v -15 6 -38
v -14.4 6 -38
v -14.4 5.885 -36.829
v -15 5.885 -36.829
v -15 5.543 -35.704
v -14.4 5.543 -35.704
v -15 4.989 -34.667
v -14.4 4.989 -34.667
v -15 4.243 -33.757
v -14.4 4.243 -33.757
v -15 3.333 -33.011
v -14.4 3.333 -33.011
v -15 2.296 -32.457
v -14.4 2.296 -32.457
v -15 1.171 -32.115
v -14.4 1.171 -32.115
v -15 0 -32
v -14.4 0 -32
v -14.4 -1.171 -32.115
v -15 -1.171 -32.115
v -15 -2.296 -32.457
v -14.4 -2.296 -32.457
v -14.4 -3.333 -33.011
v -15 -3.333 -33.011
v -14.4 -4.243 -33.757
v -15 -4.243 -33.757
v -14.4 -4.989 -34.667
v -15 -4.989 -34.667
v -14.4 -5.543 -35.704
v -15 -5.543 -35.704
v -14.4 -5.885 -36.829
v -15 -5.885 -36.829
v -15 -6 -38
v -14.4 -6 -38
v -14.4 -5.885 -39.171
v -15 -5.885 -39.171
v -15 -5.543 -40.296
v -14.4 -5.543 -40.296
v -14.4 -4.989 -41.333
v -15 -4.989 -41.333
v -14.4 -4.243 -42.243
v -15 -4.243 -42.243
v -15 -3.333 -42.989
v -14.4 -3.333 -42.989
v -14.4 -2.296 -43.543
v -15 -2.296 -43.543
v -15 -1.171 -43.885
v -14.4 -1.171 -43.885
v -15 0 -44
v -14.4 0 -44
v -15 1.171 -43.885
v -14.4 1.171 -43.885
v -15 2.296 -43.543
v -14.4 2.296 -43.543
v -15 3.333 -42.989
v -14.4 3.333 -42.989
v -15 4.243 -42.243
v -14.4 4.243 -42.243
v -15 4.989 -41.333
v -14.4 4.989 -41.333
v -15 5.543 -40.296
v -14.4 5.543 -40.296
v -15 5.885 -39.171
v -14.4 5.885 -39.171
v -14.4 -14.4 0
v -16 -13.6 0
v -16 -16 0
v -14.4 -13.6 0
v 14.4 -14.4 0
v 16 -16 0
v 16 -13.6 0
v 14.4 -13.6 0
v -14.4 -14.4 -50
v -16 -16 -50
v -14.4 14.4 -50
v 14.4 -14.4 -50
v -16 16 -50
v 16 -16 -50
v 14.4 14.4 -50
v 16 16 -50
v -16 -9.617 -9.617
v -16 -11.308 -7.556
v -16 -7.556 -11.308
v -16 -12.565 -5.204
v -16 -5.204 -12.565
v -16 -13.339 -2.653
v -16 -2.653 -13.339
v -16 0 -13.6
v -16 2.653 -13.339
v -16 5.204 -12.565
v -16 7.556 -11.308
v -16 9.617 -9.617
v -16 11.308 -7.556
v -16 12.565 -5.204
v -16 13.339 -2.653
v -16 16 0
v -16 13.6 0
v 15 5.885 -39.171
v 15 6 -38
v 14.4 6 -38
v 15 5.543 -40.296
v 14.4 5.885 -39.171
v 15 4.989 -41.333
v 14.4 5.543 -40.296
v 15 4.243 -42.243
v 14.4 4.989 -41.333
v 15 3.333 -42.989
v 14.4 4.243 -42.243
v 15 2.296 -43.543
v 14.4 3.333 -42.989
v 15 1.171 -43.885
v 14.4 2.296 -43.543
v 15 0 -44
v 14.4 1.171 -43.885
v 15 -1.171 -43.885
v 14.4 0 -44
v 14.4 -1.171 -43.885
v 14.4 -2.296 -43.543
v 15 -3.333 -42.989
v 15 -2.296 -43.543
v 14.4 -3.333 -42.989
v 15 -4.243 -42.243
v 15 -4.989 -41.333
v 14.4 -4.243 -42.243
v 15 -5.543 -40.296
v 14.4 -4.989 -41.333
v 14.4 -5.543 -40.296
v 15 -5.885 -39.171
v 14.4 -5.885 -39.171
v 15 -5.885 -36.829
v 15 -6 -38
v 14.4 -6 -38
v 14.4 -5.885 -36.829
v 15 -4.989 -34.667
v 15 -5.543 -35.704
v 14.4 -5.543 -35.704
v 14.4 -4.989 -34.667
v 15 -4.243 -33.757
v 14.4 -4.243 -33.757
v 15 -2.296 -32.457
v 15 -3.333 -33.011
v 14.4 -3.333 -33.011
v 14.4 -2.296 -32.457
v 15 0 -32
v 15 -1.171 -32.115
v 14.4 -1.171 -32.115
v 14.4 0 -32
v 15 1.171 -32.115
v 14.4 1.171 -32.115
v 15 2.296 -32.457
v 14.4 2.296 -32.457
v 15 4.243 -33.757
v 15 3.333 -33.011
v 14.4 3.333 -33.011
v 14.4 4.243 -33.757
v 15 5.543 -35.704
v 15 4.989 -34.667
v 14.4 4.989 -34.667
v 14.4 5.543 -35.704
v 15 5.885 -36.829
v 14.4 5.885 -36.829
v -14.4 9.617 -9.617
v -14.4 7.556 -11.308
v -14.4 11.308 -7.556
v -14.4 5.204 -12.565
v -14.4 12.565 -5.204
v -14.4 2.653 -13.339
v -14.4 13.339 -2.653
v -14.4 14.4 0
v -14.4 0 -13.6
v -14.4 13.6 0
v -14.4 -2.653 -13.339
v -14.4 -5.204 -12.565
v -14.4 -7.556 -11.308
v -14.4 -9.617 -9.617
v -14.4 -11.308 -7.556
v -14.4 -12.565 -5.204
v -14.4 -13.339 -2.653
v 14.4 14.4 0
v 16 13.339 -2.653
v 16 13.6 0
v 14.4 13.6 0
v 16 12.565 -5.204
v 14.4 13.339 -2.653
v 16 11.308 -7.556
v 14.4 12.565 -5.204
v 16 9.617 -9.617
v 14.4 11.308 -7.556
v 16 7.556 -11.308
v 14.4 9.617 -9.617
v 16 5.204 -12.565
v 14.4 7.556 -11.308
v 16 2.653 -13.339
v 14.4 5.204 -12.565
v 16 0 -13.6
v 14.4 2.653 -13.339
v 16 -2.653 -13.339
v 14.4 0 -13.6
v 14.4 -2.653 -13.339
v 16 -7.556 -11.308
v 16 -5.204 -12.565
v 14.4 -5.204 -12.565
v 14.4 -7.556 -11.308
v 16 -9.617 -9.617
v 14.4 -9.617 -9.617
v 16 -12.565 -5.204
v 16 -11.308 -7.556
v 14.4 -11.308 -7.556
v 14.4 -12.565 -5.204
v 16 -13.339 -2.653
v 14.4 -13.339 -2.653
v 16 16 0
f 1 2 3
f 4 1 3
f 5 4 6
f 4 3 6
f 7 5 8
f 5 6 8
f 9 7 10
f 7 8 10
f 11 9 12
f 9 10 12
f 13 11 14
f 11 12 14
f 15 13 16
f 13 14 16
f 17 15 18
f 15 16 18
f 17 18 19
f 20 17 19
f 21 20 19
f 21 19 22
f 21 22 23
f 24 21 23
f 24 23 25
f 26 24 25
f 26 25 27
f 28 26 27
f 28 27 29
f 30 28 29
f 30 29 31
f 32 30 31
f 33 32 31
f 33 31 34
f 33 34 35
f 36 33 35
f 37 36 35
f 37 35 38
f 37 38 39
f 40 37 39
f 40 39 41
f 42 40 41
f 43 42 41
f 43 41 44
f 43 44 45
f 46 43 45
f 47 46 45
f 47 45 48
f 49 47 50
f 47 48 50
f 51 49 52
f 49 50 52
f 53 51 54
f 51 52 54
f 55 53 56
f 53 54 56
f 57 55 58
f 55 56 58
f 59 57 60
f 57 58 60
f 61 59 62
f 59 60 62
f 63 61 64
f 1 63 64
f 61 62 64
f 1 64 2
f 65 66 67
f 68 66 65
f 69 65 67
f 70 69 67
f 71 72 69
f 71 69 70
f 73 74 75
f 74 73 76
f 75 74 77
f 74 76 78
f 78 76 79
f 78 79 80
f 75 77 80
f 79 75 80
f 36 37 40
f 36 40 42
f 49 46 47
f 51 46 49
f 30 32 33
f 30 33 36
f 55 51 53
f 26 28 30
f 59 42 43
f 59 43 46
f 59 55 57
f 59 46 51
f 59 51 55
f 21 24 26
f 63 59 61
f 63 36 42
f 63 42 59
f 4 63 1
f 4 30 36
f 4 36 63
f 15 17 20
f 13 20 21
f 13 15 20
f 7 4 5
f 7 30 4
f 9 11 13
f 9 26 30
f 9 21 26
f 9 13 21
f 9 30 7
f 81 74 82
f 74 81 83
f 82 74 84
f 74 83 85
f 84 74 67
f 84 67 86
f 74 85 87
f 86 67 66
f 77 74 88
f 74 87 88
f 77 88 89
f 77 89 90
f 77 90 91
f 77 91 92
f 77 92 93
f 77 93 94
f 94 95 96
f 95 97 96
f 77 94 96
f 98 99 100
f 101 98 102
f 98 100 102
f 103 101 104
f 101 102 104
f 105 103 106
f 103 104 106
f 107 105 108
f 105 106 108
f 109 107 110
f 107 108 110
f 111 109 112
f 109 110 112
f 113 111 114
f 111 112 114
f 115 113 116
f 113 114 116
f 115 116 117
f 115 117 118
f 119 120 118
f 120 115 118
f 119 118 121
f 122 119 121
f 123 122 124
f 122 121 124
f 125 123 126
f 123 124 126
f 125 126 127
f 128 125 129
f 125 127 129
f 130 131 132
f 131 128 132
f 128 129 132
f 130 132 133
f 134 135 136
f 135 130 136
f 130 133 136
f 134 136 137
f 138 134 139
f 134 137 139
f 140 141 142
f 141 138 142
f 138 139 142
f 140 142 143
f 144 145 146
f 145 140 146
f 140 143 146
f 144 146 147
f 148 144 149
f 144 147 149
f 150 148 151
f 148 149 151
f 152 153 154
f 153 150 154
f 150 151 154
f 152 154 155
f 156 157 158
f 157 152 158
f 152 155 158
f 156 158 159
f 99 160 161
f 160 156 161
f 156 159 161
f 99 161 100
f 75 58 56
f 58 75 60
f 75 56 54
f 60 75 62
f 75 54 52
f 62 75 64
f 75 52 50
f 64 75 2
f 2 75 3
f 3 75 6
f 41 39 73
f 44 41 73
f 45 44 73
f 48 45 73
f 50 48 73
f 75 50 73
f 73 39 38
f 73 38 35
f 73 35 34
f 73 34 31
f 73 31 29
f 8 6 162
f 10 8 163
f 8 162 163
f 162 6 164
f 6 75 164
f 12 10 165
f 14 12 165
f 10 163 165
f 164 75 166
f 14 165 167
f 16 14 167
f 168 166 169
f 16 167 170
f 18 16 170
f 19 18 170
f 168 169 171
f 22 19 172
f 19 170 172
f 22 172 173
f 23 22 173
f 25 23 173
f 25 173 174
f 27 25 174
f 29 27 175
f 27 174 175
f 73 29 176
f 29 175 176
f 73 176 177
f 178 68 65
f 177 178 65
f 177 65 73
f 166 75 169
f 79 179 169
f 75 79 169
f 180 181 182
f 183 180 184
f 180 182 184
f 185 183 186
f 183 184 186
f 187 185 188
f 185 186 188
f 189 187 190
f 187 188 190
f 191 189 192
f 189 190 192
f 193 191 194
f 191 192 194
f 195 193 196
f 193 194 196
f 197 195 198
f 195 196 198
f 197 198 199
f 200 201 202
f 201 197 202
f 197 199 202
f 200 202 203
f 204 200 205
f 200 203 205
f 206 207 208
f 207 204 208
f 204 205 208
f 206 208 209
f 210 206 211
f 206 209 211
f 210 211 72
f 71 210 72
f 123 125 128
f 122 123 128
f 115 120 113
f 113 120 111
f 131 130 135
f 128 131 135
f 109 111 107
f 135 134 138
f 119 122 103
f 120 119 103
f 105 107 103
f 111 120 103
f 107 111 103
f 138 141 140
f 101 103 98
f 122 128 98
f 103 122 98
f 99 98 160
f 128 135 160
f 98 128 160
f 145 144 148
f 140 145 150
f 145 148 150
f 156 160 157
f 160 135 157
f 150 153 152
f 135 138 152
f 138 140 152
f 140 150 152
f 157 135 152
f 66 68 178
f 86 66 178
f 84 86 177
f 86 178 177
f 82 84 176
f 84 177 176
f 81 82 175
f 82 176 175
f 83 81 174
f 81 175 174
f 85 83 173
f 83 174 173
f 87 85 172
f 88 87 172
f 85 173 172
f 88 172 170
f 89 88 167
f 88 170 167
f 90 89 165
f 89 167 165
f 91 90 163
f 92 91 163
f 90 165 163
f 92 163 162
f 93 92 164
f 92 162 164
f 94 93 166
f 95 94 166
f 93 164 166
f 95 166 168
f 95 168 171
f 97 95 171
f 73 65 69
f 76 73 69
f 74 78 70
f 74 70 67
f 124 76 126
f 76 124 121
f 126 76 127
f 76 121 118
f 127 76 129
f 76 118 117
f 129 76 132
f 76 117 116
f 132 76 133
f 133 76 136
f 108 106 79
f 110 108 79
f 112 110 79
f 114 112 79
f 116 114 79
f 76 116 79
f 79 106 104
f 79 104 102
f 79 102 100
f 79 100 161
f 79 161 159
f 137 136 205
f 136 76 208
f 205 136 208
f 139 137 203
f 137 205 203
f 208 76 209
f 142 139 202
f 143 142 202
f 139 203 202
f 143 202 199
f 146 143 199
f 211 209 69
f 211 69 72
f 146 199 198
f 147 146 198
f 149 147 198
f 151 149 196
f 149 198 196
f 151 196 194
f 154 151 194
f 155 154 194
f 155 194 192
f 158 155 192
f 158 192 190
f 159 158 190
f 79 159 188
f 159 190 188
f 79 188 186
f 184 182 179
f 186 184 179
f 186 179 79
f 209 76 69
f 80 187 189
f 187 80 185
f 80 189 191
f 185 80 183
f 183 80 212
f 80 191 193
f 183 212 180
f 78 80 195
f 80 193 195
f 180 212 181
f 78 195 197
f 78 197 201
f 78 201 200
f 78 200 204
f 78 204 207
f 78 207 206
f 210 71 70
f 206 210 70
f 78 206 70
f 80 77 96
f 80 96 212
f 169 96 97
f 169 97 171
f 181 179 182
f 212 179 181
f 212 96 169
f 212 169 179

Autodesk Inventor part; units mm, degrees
ref_plane "YZ Plane" through (0, 0, 0) normal (1, 0, 0) x (0, 1, 0)
ref_plane "XZ Plane" through (0, 0, 0) normal (0, 1, 0) x (-1, 0, 0)
ref_plane "XY Plane" through (0, 0, 0) normal (0, 0, 1) x (1, 0, 0)
sketch "スケッチ5" plane through (0, 0, 0) normal (0, 0, 1) x (1, 0, 0)
  line L0 (-16, 16) -> (16, 16)
  line L1 (16, 16) -> (16, -16)
  line L2 (16, -16) -> (-16, -16)
  line L3 (-16, -16) -> (-16, 16)
  line L4 (-16, 16) -> (16, -16) construction
  line L5 (16, 16) -> (-16, -16) construction
  line L6 (14.4, 14.4) -> (-14.4, 14.4)
  line L7 (-14.4, 14.4) -> (-14.4, -14.4)
  line L8 (-14.4, -14.4) -> (14.4, -14.4)
  line L9 (14.4, -14.4) -> (14.4, 14.4)
  point P0 (0, 0)
  dimension "d15" = 32
  dimension "d16" = 32
  dimension "d17" = 1.6
extrude "押し出し3" add sketch "スケッチ5" against normal blind 50
sketch "スケッチ6" plane through (0, 0, 0) normal (1, 0, 0) x (0, 1, 0)
  circle A0 centre (0, 0) radius 13.6
  dimension "d20" = 27.2
extrude "押し出し4" cut sketch "スケッチ6" along normal mid plane 32
sketch "スケッチ7" plane through (0, 0, 0) normal (1, 0, 0) x (0, 1, 0)
  line L0 (16, -50) -> (-16, -50) projected
  circle A0 centre (0, -38) radius 6
  point P0 (0, 0)
  dimension "d23" = 12
  dimension "d24" = 12
extrude "押し出し5" cut sketch "スケッチ7" along normal mid plane 30
properties part number "左右に飛び出すパイプ"
